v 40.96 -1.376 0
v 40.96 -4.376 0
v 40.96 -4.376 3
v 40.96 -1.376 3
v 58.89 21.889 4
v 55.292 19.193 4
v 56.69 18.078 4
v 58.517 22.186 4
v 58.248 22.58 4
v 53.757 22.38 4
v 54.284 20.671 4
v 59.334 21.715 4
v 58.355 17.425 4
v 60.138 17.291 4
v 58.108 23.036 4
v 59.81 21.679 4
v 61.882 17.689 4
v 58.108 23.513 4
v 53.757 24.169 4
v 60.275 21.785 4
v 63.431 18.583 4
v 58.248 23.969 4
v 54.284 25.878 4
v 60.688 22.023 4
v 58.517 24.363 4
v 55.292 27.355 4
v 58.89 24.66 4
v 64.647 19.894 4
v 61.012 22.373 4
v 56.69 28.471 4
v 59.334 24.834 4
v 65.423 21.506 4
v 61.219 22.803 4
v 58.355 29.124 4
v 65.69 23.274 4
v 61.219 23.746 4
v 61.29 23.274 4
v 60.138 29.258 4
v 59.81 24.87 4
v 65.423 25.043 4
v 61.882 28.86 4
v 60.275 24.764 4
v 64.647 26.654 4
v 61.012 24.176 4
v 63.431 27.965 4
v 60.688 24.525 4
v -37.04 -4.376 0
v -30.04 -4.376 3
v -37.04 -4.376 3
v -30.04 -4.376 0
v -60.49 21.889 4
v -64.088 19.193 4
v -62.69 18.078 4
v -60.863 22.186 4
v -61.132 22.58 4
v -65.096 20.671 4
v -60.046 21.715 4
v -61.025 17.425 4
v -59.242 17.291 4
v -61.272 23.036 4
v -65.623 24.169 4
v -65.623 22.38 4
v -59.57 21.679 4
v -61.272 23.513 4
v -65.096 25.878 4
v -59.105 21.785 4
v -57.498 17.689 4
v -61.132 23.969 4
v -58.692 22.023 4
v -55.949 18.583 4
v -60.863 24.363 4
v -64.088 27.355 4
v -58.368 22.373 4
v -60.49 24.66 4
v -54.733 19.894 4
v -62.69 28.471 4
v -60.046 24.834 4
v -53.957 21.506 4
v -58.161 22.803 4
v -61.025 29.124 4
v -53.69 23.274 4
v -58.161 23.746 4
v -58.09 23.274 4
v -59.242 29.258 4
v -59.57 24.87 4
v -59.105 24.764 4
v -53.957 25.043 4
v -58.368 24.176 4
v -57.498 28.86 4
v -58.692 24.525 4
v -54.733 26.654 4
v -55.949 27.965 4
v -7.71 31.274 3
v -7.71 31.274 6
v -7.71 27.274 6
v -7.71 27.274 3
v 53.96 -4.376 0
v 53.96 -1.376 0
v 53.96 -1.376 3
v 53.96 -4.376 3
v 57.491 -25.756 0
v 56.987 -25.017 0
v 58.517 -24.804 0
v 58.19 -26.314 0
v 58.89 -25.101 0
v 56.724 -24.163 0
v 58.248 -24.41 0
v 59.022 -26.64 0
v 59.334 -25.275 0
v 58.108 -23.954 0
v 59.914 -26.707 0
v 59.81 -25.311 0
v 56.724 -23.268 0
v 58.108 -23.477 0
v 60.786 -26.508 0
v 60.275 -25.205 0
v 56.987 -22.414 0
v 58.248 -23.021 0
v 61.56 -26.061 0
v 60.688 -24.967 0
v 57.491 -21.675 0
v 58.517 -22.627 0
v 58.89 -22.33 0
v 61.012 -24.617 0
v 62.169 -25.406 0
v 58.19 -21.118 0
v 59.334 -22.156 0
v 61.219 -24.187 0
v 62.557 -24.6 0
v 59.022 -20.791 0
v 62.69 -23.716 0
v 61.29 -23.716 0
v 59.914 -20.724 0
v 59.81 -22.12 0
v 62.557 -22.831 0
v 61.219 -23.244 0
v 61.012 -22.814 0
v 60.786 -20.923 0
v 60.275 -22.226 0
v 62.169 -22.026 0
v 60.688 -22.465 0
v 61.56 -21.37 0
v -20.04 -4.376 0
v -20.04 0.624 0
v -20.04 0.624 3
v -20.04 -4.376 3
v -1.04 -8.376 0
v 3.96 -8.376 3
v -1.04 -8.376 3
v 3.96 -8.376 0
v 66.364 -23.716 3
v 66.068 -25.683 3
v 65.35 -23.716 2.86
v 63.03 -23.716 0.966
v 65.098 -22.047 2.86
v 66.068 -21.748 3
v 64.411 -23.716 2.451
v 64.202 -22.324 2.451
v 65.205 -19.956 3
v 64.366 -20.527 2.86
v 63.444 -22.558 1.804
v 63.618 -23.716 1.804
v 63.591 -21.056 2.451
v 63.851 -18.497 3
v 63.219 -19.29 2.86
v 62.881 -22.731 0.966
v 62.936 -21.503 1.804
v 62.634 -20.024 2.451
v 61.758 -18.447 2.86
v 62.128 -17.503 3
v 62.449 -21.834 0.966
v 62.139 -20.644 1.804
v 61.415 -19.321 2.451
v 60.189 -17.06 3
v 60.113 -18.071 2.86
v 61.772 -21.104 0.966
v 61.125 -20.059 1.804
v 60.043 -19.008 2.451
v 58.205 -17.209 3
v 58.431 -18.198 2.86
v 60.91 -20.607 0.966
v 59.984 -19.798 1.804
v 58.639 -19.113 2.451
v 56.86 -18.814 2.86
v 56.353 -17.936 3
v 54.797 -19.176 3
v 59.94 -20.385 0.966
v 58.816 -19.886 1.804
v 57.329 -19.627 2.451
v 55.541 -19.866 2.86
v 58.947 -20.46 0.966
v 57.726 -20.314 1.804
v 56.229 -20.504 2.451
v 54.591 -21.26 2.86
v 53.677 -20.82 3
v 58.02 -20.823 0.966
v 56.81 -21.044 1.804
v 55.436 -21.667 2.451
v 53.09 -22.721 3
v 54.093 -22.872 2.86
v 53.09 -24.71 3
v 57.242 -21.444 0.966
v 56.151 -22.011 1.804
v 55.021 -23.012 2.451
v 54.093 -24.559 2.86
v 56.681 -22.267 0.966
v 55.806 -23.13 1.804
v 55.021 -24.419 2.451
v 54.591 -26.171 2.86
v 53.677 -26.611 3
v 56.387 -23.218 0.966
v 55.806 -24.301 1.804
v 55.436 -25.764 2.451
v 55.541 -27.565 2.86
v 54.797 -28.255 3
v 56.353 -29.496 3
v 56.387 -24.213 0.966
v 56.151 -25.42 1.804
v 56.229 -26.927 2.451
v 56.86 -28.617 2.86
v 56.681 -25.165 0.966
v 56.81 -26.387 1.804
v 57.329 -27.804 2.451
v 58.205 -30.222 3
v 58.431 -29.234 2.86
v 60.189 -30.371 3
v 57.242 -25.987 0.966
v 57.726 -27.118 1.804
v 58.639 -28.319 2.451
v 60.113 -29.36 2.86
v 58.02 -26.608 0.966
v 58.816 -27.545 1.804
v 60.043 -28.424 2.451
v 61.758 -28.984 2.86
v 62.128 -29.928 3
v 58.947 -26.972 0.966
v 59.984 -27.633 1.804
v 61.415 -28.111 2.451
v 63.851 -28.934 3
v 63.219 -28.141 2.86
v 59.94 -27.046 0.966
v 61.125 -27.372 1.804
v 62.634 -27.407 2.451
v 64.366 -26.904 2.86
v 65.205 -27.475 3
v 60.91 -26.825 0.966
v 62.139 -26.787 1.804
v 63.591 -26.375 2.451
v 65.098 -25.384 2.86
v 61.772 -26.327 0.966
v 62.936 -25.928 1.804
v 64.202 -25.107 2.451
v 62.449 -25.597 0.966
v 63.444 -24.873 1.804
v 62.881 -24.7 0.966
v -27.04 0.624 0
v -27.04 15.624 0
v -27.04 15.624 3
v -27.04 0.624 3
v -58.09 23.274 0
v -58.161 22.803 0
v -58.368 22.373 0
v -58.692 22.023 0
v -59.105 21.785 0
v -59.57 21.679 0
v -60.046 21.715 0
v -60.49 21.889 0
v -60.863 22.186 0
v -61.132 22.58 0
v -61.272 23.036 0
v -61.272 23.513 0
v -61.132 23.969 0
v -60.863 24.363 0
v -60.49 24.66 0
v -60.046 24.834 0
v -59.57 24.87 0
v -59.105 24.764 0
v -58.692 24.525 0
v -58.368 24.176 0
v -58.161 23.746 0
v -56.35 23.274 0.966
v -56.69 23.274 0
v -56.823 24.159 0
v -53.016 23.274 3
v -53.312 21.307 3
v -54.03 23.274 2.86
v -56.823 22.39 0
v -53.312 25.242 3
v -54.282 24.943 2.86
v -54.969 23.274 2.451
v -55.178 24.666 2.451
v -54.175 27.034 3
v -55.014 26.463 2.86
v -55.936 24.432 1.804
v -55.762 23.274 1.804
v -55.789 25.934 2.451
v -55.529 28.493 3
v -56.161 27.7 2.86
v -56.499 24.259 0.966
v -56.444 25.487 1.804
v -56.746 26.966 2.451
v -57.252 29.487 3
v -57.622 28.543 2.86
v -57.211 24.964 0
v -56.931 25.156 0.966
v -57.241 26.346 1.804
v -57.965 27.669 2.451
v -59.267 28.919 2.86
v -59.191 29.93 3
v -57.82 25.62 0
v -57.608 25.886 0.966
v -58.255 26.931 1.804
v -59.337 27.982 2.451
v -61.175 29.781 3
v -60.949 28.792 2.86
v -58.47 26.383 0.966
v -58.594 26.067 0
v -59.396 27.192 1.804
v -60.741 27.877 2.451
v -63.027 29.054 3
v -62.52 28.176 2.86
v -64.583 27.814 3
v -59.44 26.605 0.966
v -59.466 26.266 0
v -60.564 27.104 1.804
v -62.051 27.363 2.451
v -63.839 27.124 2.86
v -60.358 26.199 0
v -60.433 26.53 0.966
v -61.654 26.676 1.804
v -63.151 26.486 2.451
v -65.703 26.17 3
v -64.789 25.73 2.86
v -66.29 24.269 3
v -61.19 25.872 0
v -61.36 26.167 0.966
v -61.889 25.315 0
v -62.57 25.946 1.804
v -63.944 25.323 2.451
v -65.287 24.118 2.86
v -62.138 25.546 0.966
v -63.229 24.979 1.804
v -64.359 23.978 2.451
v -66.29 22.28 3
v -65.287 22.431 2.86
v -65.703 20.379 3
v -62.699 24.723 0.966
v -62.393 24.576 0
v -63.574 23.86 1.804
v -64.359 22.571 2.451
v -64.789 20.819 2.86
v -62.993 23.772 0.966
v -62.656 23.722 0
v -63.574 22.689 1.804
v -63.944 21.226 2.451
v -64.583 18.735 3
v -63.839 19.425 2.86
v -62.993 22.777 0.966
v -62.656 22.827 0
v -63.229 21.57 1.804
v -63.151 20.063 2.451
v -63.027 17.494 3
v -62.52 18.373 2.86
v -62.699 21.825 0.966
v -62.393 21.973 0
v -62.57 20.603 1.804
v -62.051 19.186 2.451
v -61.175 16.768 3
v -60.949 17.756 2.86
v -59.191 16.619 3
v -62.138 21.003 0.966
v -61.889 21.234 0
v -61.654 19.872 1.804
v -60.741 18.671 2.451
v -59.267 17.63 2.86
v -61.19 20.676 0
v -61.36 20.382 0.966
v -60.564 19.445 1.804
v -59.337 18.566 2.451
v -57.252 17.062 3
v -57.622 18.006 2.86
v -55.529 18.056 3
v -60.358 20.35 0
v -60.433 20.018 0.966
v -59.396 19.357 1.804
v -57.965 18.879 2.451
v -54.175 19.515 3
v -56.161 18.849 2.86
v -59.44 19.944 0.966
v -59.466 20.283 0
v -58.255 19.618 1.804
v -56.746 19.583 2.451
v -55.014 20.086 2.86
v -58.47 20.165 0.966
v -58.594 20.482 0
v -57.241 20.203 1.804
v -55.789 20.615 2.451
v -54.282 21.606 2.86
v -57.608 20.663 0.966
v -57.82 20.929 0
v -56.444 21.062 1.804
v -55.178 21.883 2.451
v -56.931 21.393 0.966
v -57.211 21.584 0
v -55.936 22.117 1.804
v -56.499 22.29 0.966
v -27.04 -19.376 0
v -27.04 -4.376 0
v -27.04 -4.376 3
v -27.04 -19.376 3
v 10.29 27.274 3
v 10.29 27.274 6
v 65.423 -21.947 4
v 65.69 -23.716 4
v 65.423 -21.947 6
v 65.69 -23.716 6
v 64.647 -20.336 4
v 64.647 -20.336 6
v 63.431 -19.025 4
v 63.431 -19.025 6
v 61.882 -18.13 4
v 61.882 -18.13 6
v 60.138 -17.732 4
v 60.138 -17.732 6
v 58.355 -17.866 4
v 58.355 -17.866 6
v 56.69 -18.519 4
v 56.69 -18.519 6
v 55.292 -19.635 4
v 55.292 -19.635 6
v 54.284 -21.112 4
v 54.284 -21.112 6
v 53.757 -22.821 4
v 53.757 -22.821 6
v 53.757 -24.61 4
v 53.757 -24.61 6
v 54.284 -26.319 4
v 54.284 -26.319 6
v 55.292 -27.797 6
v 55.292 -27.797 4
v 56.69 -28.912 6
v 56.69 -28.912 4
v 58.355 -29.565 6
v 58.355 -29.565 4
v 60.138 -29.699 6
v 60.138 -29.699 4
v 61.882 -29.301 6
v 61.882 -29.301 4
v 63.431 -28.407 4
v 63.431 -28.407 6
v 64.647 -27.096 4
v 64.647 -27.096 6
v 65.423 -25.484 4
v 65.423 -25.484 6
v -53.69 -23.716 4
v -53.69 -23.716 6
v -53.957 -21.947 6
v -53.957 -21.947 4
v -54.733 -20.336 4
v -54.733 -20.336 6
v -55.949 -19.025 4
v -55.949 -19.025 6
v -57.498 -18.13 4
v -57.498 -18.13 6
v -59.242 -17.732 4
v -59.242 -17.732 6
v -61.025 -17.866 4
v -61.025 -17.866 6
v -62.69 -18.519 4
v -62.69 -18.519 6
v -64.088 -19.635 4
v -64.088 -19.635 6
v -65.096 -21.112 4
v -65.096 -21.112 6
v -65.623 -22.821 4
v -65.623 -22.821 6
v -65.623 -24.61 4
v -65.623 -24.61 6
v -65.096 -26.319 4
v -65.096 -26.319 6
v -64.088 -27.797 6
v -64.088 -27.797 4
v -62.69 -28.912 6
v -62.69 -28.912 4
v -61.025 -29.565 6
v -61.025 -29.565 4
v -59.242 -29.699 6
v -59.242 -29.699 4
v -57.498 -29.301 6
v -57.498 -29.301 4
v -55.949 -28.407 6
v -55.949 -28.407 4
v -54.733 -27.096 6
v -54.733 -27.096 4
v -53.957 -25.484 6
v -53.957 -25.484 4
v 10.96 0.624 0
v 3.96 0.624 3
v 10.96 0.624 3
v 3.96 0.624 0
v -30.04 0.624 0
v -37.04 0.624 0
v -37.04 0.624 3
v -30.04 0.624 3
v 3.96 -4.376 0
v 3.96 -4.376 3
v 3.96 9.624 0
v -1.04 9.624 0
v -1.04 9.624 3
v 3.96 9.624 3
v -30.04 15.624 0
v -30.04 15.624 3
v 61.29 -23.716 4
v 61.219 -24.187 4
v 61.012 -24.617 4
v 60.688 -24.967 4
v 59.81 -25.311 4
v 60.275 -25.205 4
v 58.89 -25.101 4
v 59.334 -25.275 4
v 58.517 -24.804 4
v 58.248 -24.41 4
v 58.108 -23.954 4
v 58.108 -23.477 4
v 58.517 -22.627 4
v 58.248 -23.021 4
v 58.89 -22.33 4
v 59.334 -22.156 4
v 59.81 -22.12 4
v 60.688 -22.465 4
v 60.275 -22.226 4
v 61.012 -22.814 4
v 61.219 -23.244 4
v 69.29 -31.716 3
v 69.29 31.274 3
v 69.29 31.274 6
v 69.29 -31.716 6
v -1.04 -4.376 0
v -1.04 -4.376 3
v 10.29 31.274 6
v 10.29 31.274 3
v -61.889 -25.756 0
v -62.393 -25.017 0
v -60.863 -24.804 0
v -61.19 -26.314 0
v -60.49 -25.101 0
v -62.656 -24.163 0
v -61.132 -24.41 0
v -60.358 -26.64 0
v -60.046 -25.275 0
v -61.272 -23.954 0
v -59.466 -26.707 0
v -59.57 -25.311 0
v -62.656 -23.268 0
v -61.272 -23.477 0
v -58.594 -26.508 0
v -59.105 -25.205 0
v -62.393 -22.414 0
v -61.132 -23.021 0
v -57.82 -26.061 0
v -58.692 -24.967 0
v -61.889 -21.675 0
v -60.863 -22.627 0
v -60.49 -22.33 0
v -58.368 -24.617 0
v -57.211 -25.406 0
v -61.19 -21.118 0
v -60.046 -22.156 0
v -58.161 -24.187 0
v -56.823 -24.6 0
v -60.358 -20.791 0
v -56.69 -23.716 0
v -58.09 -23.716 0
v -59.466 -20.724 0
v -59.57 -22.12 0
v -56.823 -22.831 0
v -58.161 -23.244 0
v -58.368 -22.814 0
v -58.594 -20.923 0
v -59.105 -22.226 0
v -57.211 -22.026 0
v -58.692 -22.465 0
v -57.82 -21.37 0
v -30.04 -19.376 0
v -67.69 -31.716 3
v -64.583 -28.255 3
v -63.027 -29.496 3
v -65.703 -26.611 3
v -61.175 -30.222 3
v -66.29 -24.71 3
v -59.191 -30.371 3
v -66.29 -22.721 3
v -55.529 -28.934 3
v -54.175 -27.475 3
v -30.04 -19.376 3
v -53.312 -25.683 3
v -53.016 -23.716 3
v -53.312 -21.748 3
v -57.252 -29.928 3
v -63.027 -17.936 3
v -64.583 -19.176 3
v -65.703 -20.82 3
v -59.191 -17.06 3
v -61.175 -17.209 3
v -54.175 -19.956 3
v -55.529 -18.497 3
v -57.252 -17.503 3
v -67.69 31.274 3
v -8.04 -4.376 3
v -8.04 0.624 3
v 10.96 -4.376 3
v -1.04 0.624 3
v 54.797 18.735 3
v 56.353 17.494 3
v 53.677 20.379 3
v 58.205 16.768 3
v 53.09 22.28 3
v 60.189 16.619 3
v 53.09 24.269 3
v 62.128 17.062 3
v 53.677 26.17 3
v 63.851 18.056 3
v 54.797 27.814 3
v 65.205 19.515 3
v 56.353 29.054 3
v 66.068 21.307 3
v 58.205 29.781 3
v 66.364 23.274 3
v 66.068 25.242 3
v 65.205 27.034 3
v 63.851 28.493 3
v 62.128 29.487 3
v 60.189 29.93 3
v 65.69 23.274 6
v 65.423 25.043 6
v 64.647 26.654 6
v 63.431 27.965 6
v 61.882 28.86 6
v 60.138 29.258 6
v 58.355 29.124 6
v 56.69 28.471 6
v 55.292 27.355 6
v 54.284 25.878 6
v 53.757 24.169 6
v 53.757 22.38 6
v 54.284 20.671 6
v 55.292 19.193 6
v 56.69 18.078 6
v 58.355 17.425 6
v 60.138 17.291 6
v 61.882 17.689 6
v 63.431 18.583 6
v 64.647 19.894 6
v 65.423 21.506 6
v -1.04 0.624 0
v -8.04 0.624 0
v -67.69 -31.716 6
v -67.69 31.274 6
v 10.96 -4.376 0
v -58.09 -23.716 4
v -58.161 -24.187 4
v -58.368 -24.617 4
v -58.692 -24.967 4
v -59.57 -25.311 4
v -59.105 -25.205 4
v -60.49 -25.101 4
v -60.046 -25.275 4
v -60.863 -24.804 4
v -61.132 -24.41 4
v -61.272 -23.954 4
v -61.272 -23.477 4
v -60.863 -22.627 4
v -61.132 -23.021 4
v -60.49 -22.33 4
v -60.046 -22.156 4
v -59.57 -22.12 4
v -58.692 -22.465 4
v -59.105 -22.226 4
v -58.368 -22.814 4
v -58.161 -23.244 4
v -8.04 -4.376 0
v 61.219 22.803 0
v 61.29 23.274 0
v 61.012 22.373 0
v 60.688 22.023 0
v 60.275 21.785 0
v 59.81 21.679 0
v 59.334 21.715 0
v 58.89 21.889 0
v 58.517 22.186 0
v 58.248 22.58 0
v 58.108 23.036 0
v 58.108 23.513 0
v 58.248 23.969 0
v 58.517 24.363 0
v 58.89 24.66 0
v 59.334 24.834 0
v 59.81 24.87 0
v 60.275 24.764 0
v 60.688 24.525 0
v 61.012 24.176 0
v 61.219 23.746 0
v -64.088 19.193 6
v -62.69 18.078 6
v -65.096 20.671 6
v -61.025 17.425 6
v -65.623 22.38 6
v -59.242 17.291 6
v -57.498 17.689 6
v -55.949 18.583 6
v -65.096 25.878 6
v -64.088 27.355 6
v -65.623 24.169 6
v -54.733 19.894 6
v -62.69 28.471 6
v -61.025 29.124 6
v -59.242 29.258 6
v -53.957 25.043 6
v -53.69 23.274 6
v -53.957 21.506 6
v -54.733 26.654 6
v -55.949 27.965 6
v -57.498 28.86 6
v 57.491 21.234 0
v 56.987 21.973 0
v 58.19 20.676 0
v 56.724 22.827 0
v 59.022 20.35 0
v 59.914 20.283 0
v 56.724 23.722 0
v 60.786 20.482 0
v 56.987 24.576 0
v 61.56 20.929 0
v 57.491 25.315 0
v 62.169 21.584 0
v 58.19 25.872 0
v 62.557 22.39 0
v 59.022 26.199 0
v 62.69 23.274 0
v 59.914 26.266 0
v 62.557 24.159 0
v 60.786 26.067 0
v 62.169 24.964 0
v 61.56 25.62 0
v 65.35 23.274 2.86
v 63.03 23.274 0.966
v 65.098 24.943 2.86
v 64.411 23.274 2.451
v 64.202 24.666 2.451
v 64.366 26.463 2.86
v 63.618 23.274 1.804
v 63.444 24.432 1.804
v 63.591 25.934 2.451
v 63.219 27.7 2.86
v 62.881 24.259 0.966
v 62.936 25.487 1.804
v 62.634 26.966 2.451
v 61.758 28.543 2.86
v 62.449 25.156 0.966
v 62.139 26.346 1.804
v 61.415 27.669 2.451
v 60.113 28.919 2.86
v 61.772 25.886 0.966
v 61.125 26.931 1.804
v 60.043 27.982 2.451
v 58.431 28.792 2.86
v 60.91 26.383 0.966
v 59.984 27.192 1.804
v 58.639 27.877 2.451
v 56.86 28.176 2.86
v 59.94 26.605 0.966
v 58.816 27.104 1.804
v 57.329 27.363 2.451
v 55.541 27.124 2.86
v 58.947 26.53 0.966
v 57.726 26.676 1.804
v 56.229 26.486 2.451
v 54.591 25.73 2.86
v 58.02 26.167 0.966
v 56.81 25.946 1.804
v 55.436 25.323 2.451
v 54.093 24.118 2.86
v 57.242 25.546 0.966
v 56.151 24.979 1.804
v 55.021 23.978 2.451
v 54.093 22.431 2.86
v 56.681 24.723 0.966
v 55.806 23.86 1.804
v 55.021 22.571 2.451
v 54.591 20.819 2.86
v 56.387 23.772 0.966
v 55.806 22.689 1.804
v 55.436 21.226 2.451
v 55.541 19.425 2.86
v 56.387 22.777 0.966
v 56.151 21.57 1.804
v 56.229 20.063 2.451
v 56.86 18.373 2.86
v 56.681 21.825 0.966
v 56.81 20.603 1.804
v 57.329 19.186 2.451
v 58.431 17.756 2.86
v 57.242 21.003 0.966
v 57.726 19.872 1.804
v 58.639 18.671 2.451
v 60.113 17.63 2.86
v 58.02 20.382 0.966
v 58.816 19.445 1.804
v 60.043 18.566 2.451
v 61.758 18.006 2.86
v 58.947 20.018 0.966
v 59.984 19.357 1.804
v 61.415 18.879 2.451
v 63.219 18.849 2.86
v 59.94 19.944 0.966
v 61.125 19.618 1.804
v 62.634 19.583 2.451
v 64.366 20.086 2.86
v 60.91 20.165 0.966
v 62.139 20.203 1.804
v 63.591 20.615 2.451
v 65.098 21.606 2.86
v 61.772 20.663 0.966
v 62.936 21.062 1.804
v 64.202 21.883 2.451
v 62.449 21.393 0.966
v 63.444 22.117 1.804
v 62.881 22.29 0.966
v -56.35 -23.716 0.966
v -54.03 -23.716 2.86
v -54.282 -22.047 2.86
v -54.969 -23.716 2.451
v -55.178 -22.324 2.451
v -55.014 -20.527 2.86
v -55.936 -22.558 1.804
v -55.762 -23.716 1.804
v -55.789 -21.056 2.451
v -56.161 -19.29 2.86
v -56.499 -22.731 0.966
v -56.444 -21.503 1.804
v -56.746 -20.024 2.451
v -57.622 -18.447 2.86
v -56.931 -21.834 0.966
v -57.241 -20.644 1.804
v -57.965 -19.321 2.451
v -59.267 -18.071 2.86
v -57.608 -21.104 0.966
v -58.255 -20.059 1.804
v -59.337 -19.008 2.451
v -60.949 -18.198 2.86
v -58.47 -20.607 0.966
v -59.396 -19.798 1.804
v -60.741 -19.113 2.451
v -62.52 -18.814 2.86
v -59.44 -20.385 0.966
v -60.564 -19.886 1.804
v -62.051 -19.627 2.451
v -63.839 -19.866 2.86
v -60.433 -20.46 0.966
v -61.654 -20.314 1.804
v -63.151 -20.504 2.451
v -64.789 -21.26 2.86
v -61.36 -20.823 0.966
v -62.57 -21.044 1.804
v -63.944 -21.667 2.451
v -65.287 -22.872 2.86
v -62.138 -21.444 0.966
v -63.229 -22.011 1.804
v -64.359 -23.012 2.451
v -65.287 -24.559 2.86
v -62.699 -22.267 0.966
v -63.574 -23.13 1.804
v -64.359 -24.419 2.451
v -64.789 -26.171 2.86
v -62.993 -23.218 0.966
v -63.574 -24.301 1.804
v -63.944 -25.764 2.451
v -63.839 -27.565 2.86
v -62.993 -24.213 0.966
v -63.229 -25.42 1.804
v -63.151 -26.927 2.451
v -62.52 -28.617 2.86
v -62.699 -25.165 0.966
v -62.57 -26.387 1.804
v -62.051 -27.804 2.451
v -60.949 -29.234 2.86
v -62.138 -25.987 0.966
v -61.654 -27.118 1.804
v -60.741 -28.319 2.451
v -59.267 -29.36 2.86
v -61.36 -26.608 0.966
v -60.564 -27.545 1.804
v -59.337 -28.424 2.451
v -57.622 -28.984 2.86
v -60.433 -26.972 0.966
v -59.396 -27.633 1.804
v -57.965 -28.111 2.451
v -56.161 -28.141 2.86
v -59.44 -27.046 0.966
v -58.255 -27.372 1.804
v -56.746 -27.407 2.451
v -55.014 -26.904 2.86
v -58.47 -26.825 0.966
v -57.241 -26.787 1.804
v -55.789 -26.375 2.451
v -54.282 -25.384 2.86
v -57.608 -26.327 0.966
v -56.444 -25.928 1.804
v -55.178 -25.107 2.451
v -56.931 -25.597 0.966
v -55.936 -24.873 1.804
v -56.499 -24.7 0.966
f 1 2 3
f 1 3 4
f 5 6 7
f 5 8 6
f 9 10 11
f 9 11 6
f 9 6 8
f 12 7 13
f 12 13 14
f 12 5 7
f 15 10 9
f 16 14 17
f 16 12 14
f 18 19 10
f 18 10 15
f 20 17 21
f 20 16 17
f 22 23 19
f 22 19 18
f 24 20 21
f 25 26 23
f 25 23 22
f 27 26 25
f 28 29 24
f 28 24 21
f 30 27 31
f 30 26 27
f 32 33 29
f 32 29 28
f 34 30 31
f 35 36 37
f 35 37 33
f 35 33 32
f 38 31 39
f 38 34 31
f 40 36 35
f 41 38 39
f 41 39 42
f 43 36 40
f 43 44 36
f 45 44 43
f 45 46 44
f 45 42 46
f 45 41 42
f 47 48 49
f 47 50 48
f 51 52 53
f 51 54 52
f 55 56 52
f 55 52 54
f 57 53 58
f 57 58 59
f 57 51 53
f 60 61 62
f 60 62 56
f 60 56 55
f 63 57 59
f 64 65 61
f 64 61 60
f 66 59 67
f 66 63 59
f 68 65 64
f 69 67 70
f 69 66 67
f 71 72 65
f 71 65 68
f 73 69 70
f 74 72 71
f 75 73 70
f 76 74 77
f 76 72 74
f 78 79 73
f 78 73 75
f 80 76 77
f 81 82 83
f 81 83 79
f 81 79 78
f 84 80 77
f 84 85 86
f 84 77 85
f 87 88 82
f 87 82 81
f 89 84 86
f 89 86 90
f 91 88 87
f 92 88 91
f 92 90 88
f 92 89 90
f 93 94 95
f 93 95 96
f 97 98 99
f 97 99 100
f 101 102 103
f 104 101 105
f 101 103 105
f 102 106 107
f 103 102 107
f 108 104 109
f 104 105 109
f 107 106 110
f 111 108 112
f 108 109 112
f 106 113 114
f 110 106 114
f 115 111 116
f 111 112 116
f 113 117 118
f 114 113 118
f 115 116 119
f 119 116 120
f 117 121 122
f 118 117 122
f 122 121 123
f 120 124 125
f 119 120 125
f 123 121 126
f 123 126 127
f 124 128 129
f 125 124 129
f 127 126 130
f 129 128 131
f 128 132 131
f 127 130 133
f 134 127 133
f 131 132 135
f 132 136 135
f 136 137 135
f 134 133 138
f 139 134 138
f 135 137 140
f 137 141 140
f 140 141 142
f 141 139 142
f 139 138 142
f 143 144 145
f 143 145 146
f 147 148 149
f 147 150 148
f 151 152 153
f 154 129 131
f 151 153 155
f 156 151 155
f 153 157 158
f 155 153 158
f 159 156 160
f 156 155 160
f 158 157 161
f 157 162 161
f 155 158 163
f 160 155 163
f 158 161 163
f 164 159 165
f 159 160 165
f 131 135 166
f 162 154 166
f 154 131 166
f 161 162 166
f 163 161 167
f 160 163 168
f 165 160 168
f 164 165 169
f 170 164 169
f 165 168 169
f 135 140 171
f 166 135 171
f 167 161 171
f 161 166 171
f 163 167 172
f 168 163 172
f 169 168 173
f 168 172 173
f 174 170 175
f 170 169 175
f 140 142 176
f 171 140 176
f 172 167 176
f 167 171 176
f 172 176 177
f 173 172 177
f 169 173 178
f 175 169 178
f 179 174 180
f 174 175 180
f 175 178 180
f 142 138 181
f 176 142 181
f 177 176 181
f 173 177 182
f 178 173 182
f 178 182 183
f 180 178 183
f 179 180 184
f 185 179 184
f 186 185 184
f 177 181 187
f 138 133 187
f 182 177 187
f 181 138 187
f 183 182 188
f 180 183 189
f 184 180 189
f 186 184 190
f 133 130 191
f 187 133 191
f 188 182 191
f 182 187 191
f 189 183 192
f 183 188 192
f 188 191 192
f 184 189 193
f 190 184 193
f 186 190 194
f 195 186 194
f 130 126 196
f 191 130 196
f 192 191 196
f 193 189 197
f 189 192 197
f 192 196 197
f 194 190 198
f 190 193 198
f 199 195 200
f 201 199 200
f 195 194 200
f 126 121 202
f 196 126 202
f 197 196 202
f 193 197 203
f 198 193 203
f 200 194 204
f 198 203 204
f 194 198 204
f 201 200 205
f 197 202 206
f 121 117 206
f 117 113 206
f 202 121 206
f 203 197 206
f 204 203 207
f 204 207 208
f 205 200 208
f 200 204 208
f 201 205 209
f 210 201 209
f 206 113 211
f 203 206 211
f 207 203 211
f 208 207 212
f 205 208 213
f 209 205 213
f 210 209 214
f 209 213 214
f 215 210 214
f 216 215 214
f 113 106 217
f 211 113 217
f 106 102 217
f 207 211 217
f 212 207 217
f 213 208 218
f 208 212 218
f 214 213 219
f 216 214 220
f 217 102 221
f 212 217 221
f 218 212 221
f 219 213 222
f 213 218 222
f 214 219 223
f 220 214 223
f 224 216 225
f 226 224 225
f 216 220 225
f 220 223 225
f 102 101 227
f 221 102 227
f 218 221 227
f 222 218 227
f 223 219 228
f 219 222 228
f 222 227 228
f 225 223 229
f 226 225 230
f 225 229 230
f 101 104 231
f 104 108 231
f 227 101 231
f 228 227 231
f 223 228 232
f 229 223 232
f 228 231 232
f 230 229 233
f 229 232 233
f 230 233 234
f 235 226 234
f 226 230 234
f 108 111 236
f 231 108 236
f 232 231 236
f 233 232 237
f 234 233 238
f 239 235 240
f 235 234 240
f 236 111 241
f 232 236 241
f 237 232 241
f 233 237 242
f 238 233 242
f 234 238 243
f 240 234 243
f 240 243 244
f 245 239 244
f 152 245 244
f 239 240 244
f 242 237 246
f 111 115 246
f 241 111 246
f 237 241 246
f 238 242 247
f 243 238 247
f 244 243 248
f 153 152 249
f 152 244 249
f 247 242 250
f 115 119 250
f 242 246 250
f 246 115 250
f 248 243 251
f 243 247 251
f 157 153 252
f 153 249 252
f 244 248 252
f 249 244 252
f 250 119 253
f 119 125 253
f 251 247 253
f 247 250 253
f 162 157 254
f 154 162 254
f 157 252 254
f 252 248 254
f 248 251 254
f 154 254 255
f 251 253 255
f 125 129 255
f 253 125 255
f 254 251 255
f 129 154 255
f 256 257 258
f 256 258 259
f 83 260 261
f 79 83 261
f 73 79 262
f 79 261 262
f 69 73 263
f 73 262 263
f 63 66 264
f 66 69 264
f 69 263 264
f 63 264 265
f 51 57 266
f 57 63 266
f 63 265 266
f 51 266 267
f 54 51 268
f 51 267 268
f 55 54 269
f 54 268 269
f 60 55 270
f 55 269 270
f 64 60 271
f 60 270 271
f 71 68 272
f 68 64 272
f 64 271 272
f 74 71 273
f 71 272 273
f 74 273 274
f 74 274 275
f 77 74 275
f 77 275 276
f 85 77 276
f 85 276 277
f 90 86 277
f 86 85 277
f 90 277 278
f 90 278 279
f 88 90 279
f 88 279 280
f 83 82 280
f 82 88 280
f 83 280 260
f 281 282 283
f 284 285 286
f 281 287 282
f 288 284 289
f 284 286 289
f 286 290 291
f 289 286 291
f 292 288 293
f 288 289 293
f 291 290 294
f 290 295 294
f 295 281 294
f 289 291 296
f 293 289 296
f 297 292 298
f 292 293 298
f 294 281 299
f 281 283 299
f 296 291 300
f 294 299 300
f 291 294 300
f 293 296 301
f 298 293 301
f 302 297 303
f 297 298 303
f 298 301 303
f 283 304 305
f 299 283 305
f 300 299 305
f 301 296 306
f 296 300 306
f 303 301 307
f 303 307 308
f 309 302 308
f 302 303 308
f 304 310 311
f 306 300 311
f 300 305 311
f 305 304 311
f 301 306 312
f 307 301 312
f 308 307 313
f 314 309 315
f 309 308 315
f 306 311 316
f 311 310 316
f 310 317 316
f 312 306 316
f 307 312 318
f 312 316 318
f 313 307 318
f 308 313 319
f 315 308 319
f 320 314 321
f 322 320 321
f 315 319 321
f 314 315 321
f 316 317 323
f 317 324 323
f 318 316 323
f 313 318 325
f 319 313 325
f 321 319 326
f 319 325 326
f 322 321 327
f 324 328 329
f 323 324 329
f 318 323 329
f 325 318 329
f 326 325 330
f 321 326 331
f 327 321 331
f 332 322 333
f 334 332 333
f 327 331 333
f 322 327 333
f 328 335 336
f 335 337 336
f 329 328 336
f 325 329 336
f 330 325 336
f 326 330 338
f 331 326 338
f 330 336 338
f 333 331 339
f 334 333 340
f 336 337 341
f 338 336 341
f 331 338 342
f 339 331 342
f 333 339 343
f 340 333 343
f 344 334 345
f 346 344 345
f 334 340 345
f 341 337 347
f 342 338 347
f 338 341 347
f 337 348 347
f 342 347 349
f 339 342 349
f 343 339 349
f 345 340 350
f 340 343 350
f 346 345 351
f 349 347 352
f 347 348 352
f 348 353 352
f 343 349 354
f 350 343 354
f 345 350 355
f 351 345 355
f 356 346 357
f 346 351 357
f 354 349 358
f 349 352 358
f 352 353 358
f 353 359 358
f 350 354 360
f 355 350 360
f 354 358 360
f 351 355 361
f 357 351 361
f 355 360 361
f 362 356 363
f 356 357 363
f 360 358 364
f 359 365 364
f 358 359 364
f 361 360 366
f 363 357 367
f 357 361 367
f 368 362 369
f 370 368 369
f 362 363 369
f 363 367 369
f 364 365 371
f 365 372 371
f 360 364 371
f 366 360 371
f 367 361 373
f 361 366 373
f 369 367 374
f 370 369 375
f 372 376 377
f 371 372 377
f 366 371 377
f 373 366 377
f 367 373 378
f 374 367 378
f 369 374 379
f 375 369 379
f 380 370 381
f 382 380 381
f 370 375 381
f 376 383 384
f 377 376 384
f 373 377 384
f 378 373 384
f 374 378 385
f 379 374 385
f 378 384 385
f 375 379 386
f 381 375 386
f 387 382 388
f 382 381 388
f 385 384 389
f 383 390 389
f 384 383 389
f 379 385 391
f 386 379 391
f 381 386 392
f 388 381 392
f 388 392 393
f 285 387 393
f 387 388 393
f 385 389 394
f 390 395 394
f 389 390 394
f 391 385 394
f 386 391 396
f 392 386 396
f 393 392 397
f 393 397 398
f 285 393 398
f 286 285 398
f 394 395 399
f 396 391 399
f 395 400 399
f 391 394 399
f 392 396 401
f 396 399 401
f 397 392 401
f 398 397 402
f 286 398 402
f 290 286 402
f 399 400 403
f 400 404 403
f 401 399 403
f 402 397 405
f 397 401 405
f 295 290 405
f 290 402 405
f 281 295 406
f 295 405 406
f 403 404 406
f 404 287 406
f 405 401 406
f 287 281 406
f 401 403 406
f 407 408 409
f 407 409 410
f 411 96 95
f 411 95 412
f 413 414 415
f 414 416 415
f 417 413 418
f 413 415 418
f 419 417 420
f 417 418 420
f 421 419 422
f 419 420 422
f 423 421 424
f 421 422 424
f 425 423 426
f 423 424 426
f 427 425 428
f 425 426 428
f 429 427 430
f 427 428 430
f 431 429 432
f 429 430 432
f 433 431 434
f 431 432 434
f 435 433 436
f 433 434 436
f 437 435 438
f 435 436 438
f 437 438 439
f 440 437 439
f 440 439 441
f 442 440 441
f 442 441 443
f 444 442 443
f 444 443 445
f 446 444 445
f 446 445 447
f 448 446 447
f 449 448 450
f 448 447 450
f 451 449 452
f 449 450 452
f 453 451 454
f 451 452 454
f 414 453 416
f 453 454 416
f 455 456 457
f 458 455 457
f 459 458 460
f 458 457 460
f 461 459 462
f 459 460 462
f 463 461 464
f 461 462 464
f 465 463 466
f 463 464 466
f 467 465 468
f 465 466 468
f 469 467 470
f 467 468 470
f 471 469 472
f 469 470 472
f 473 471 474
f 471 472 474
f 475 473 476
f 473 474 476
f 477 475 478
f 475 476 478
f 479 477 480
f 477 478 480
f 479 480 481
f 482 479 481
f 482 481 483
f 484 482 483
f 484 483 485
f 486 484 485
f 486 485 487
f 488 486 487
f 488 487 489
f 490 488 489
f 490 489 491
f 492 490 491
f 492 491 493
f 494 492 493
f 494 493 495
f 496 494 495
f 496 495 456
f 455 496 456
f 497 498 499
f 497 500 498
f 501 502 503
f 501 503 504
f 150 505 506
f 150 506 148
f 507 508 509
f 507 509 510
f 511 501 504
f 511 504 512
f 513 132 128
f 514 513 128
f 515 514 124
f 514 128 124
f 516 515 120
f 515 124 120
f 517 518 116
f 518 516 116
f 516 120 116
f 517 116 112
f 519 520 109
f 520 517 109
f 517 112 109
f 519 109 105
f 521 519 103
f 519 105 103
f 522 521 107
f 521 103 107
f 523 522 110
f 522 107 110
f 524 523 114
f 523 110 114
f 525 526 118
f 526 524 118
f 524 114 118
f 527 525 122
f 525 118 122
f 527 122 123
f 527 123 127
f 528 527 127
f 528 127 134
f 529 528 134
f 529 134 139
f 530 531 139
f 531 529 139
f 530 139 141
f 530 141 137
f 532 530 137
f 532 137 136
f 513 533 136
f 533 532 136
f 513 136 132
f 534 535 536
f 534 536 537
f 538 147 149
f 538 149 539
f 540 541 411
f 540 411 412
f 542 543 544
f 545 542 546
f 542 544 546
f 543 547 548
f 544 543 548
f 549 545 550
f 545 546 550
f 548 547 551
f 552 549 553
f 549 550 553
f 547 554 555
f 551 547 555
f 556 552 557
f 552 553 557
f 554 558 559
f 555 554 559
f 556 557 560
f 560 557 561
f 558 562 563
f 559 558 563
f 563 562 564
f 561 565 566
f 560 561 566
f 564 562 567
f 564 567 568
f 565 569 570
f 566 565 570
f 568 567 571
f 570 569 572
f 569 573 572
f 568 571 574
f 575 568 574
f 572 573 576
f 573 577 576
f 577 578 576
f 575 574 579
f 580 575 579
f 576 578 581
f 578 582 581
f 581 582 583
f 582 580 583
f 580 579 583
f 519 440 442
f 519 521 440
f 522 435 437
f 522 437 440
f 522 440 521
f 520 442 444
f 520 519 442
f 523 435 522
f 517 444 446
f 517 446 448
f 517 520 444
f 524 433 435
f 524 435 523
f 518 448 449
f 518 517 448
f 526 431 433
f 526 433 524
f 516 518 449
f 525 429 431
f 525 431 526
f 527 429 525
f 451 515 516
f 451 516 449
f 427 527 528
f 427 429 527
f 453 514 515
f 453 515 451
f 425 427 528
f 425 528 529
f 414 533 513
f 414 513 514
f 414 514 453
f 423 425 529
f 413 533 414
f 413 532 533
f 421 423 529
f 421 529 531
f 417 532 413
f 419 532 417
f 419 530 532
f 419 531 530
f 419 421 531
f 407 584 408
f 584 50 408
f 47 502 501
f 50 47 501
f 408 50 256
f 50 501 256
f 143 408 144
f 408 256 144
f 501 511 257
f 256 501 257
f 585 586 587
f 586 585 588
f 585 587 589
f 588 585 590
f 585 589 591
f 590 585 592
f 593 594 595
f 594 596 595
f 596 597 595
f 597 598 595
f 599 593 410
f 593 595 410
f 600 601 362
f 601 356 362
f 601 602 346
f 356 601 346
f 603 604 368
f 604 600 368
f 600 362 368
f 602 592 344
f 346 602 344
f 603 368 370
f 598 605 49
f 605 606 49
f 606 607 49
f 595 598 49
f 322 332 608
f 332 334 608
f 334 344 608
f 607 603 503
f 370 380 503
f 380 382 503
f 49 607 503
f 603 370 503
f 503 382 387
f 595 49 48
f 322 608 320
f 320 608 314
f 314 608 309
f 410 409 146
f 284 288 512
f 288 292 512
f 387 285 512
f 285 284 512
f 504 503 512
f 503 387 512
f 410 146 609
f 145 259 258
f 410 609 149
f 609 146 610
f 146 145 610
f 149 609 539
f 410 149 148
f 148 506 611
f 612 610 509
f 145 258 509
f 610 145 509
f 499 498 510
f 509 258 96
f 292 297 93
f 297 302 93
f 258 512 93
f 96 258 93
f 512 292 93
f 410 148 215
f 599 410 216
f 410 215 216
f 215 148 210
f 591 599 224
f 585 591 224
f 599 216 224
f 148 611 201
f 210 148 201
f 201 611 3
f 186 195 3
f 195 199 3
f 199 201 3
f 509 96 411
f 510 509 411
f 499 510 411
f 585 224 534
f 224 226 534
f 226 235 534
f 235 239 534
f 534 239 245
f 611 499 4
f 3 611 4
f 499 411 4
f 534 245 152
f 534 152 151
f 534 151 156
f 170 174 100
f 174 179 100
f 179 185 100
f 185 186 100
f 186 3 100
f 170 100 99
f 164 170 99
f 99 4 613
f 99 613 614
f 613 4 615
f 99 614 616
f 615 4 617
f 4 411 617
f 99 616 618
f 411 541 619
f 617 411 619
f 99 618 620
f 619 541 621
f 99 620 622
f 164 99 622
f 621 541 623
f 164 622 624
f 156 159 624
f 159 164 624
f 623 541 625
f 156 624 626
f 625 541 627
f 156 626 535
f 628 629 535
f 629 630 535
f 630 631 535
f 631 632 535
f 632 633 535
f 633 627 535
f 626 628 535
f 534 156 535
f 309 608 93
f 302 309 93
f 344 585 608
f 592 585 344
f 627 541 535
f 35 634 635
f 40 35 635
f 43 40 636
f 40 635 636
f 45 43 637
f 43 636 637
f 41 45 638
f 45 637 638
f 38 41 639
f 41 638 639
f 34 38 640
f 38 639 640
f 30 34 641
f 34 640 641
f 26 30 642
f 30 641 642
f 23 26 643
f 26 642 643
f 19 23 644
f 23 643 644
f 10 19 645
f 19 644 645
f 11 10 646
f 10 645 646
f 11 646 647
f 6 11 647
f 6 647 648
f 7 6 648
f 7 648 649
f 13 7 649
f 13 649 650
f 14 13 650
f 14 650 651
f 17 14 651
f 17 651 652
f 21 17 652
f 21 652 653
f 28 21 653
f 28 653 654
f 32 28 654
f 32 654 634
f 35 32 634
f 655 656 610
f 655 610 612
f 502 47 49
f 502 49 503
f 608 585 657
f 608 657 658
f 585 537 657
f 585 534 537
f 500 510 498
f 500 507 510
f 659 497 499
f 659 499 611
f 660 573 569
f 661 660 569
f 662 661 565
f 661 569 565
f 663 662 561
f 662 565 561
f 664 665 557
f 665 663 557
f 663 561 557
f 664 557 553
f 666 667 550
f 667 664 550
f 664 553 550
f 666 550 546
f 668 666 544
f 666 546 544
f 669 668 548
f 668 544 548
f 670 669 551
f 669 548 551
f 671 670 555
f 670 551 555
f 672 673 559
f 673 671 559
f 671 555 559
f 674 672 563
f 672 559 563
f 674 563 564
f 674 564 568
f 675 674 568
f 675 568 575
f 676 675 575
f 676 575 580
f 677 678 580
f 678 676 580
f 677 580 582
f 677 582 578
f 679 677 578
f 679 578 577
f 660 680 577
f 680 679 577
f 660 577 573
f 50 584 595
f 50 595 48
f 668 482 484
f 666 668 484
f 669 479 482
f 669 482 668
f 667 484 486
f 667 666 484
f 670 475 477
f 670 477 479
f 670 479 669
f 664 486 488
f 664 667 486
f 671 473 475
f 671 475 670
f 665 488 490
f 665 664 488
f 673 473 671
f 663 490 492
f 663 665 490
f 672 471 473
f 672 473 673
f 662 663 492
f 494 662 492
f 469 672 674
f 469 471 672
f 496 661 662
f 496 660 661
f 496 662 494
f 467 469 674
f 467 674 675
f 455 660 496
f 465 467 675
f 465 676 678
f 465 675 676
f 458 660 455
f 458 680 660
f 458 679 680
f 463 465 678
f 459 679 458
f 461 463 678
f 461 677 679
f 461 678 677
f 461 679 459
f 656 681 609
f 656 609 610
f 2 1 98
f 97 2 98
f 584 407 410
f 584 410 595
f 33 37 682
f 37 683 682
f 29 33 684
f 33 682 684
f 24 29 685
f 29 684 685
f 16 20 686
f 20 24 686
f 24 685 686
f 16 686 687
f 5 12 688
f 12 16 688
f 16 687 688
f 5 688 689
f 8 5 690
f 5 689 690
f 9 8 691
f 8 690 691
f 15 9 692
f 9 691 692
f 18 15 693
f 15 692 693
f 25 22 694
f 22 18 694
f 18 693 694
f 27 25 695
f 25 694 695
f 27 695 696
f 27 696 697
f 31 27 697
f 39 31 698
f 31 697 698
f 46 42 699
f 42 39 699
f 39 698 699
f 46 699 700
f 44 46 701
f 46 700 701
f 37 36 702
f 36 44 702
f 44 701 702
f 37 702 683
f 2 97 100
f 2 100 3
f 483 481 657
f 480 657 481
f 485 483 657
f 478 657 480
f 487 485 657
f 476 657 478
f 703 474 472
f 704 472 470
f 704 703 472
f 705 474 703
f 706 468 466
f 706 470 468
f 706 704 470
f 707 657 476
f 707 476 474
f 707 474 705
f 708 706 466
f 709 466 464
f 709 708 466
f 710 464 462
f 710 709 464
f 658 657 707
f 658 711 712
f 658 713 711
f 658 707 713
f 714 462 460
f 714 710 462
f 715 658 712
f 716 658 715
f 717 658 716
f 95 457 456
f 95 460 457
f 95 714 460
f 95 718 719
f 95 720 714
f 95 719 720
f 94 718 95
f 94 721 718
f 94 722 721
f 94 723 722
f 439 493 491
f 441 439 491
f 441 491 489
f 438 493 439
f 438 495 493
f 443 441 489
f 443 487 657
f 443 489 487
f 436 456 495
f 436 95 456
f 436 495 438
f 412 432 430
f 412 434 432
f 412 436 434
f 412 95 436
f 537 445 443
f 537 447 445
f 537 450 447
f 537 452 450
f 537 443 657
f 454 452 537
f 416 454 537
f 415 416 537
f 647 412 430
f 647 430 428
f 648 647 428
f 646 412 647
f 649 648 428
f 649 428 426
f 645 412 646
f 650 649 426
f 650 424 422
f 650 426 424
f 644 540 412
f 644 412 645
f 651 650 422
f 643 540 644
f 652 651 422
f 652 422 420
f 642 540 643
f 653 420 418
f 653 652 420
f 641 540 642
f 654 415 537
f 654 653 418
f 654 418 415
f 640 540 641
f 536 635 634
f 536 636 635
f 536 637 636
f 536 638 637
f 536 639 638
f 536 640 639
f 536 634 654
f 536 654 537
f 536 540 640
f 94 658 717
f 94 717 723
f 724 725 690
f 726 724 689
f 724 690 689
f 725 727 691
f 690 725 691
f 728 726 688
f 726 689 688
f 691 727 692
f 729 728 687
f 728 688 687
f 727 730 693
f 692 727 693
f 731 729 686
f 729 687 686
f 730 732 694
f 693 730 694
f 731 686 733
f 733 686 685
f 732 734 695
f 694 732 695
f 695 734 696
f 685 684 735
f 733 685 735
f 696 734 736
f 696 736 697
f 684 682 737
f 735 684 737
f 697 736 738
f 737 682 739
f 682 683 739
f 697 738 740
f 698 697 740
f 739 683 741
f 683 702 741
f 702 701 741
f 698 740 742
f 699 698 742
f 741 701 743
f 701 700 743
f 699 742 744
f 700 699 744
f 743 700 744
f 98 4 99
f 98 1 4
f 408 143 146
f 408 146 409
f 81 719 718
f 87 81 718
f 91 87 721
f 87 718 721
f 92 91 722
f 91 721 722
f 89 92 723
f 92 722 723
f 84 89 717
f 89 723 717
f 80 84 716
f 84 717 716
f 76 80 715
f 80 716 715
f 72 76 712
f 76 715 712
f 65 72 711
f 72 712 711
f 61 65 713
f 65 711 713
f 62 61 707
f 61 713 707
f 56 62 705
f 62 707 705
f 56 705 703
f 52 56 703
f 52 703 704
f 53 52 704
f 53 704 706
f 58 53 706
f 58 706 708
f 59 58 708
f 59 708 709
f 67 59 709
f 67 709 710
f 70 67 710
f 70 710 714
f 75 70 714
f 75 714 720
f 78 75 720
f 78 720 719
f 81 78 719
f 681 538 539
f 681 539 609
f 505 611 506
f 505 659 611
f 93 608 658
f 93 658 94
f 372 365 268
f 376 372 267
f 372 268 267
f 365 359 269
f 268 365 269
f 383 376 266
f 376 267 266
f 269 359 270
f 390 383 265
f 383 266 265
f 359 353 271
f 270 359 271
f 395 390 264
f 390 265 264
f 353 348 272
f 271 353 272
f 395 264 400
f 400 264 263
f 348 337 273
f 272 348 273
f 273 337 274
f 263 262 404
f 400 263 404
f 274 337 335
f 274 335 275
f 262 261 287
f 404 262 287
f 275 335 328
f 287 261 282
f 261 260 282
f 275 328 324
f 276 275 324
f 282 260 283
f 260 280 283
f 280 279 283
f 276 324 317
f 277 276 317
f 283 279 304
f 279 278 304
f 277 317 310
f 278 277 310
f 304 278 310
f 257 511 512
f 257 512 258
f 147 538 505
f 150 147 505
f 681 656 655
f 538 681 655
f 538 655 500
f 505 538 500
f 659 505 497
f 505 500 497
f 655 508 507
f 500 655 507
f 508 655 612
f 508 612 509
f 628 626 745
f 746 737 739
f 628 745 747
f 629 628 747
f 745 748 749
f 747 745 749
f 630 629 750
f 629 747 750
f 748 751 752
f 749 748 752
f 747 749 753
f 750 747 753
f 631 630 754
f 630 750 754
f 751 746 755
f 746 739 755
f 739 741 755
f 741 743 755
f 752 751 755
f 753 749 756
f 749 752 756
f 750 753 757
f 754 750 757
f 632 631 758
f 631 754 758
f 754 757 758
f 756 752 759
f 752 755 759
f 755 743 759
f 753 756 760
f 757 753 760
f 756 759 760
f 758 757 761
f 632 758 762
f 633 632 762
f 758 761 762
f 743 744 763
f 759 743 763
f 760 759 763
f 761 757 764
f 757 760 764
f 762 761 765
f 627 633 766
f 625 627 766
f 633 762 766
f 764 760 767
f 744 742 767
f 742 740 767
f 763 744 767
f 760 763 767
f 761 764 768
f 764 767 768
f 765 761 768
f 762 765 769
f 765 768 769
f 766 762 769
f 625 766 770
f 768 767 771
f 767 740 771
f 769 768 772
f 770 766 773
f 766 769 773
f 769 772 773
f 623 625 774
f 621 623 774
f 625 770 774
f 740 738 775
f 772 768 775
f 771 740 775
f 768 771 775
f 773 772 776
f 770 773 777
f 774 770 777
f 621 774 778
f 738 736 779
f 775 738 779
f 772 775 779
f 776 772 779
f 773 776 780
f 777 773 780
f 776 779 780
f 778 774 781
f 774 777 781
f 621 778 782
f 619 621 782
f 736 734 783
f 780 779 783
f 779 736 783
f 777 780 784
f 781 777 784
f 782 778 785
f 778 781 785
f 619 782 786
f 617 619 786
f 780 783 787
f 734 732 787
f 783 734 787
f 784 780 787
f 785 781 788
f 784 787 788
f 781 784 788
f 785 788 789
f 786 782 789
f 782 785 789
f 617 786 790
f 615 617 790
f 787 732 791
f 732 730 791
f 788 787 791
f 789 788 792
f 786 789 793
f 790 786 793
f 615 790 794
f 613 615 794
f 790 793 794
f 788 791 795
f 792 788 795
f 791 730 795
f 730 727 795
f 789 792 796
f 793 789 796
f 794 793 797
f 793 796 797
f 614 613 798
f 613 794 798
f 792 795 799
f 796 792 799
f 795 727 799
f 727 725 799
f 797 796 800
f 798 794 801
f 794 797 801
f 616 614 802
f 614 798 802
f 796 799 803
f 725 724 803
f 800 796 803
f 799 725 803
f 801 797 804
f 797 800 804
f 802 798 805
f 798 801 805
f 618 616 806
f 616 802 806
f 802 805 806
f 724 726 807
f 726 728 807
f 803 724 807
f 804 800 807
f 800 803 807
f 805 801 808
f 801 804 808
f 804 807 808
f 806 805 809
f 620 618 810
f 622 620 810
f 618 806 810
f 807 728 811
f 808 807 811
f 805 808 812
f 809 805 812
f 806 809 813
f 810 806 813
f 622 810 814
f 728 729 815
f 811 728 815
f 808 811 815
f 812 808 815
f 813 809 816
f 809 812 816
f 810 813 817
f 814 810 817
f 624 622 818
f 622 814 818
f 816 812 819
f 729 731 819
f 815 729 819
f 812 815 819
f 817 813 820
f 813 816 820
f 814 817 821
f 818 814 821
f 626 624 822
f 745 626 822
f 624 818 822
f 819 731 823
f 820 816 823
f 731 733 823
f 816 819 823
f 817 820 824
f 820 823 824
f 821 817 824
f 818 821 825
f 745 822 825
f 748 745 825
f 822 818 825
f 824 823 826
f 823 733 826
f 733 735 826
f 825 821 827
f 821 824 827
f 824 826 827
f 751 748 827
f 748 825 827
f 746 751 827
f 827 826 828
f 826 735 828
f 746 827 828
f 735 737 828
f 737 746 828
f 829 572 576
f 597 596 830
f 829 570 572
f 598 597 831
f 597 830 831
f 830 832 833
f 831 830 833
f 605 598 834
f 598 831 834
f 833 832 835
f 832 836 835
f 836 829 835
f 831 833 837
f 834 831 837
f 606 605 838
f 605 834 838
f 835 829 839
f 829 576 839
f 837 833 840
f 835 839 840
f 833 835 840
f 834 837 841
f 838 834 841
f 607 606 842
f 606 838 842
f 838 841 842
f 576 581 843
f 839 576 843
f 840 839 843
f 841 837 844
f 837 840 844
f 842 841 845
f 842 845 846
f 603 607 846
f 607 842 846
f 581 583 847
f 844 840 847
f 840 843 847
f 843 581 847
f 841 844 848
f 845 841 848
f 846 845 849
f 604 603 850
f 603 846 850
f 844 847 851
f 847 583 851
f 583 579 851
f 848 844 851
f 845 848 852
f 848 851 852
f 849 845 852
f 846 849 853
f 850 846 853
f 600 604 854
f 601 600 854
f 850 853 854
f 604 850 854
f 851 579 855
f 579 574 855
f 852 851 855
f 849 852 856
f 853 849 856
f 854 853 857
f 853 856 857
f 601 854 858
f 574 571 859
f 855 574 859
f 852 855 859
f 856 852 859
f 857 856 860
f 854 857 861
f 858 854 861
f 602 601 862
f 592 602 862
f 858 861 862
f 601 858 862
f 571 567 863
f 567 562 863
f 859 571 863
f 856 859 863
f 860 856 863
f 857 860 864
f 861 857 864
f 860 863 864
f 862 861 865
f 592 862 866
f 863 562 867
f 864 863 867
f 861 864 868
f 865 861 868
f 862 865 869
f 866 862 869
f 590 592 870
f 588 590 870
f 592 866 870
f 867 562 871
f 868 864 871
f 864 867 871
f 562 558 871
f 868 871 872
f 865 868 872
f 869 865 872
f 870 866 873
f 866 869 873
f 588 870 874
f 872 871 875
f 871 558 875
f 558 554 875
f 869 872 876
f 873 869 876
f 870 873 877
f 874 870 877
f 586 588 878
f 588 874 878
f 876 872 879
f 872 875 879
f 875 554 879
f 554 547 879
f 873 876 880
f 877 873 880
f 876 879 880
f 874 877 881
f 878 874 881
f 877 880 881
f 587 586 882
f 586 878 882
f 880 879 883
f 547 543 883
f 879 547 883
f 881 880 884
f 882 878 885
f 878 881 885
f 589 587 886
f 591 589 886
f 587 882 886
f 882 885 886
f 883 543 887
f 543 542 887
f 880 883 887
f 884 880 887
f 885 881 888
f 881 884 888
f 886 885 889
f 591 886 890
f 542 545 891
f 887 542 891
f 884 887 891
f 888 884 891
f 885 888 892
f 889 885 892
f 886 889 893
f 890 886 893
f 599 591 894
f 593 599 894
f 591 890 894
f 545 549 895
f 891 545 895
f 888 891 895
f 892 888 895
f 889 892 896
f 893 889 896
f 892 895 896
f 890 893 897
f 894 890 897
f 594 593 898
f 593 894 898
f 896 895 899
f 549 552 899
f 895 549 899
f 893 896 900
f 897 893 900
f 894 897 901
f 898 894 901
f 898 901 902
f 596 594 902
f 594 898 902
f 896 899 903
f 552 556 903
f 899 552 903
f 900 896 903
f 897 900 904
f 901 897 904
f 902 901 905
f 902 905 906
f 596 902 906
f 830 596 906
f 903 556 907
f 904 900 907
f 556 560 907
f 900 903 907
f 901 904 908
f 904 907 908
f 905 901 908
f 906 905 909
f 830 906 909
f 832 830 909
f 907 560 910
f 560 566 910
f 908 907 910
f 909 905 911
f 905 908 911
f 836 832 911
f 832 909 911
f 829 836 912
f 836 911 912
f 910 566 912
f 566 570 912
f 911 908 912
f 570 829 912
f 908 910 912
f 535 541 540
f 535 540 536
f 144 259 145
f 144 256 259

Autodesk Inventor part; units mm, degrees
ref_plane "YZ Plane" through (0, 0, 0) normal (1, 0, 0) x (0, 1, 0)
ref_plane "XZ Plane" through (0, 0, 0) normal (0, 1, 0) x (-1, 0, 0)
ref_plane "XY Plane" through (0, 0, 0) normal (0, 0, 1) x (1, 0, 0)
ref_plane "Arbeitsebene1" through (0, 0, 0) normal (0, 0, 1) x (1, 0, 0)
sketch "Skizze1" plane through (0, 0, 0) normal (0, 0, 1) x (1, 0, 0)
  circle A0 centre (-59.69, 23.2744) radius 1.6 projected
  circle A1 centre (59.69, 23.2744) radius 1.6 projected
  circle A2 centre (59.69, -23.7156) radius 1.6 projected
  circle A3 centre (-59.69, -23.7156) radius 1.6 projected
  circle A4 centre (-59.69, 23.2744) radius 3
  circle A5 centre (59.69, 23.2744) radius 3
  circle A6 centre (59.69, -23.7156) radius 3
  circle A7 centre (-59.69, -23.7156) radius 3
  point P0 (0, 0)
  dimension "d0" = 6
  dimension "d1" = 6
  dimension "d2" = 6
  dimension "d3" = 6
extrude "Extrusion1" add sketch "Skizze1" along normal blind 3
ref_plane "Arbeitsebene2" through (0, 0, 0) normal (0, 0, 1) x (1, 0, 0)
sketch "Skizze2" plane through (0, 0, 0) normal (0, 0, 1) x (1, 0, 0)
  line L0 (-30.04, 15.6244) -> (-27.04, 15.6244)
  line L1 (-27.04, -19.3756) -> (-30.04, -19.3756)
  line L2 (-20.04, 0.6244) -> (-20.04, -4.3756)
  line L3 (-37.04, -4.3756) -> (-37.04, 0.6244)
  line L4 (-1.04, 9.6244) -> (3.96, 9.6244)
  line L5 (3.96, -8.3756) -> (-1.04, -8.3756)
  line L6 (10.96, 0.6244) -> (10.96, -4.3756)
  line L7 (-8.04, -4.3756) -> (-8.04, 0.6244)
  line L8 (40.96, -1.3756) -> (53.96, -1.3756)
  line L9 (53.96, -1.3756) -> (53.96, -4.3756)
  line L10 (53.96, -4.3756) -> (40.96, -4.3756)
  line L11 (40.96, -4.3756) -> (40.96, -1.3756)
  line L12 (-8.04, 0.6244) -> (-1.04, 0.6244)
  line L13 (3.96, 0.6244) -> (10.96, 0.6244)
  line L14 (3.96, 9.6244) -> (3.96, 0.6244)
  line L15 (3.96, -4.3756) -> (3.96, -8.3756)
  line L16 (10.96, -4.3756) -> (3.96, -4.3756)
  line L17 (-1.04, -4.3756) -> (-8.04, -4.3756)
  line L18 (-1.04, -8.3756) -> (-1.04, -4.3756)
  line L19 (-1.04, 0.6244) -> (-1.04, 9.6244)
  line L20 (-37.04, 0.6244) -> (-30.04, 0.6244)
  line L21 (-27.04, 0.6244) -> (-20.04, 0.6244)
  line L22 (-27.04, 15.6244) -> (-27.04, 0.6244)
  line L23 (-27.04, -4.3756) -> (-27.04, -19.3756)
  line L24 (-30.04, -19.3756) -> (-30.04, -4.3756)
  line L25 (-30.04, 0.6244) -> (-30.04, 15.6244)
  line L26 (-20.04, -4.3756) -> (-27.04, -4.3756)
  line L27 (-30.04, -4.3756) -> (-37.04, -4.3756)
  line L28 (-66.04, -24.3506) -> (-66.04, 23.2744) projected
  line L29 (-59.69, 29.6244) -> (59.69, 29.6244) projected
  point P0 (0, 0)
  dimension "d6" = 3
  dimension "d7" = 7
  dimension "d8" = 7
  dimension "d9" = 7
  dimension "d10" = 7
  dimension "d11" = 3
  dimension "d12" = 15
  dimension "d13" = 15
  dimension "d14" = 15
  dimension "d15" = 15
  dimension "d16" = 5
  dimension "d17" = 29
  dimension "d18" = 14
  dimension "d19" = 20
  dimension "d20" = 18
  dimension "d21" = 7
  dimension "d22" = 7
  dimension "d23" = 12
  dimension "d24" = 5
  dimension "d25" = 13
  dimension "d26" = 30
  dimension "d27" = 31
extrude "Extrusion2" add sketch "Skizze2" along normal up to surface (3 mm away)
sketch "Skizze3" plane through (-8.04, 0.6244, 3) normal (0, 0, 1) x (1, 0, 0)
  line L0 (-59.65, 30.65) -> (77.33, 30.65)
  line L1 (77.33, 30.65) -> (77.33, -32.34)
  line L2 (77.33, -32.34) -> (-59.65, -32.34)
  line L3 (-59.65, -32.34) -> (-59.65, 30.65)
  circle A0 centre (67.73, 22.65) radius 1.6 projected
  circle A1 centre (-51.65, 22.65) radius 1.6 projected
  circle A2 centre (-51.65, -24.34) radius 1.6 projected
  circle A3 centre (67.73, -24.34) radius 1.6 projected
  point P0 (8.04, -0.6244)
  dimension "d31" = 8
  dimension "d32" = 8
  dimension "d33" = 8
  dimension "d34" = 8
extrude "Extrusion3" add sketch "Skizze3" along normal blind 3
fillet "Rundung1" radius 3.75 4 edges at (-62.69, -23.7156, 3) (56.69, -23.7156, 3) (56.69, 23.2744, 3) (-62.69, 23.2744, 3)
sketch "Skizze5" plane through (-8.04, 0.6244, 6) normal (0, 0, 1) x (1, 0, 0)
  circle A0 centre (67.73, 22.65) radius 1.6 projected
  circle A1 centre (67.73, 22.65) radius 6
  circle A2 centre (67.73, -24.34) radius 6
  circle A3 centre (-51.65, 22.65) radius 1.6 projected
  circle A4 centre (-51.65, 22.65) radius 6
  circle A5 centre (-51.65, -24.34) radius 6
  circle A6 centre (-51.65, -24.34) radius 1.6 projected
  circle A7 centre (67.73, -24.34) radius 1.6 projected
  point P0 (8.04, -0.6244)
  dimension "d44" = 12
  dimension "d45" = 12
  dimension "d46" = 12
  dimension "d47" = 12
extrude "Extrusion5" cut sketch "Skizze5" against normal blind 2
sketch "Skizze6" plane through (-67.69, 31.2744, 3) normal (0, 1, 0) x (1, 0, 0)
  line L0 (0, 0) -> (136.98, 0) projected
  line L1 (59.98, 0) -> (77.98, 0)
  line L2 (77.98, 0) -> (77.98, -1.5)
  line L3 (77.98, -1.5) -> (59.98, -1.5)
  line L4 (59.98, -1.5) -> (59.98, 0)
  line L5 (136.98, 0) -> (136.98, -3) projected
  point P0 (67.69, 3)
  dimension "d50" = 1.5
  dimension "d51" = 18
  dimension "d52" = 59
extrude "Extrusion6" cut sketch "Skizze6" against normal blind 4
move faces "Verschieben1" translate (0, 0, 2.5) faces at (4.29, 29.9411, 4.5)
sketch "Skizze7" plane through (-8.04, 0.6244, 6) normal (0, 0, 1) x (1, 0, 0)
  line L0 (-59.65, 30.65) -> (-59.65, -32.34) projected
  line L1 (-59.65, -32.34) -> (77.33, -32.34) projected
  line L2 (0.33, 30.65) -> (-59.65, 30.65) projected
  line L3 (77.33, -32.34) -> (77.33, 30.65) projected
  line L4 (77.33, 30.65) -> (18.33, 30.65) projected
  line L5 (-54.65, -32.34) -> (72.33, -32.34)
  line L6 (77.33, -27.34) -> (77.33, 25.65)
  line L7 (-59.65, 25.65) -> (-59.65, -27.34)
  line L8 (0.33, 26.65) -> (18.33, 26.65) projected
  line L9 (18.33, 30.65) -> (18.33, 26.65)
  line L10 (18.33, 26.65) -> (0.33, 26.65)
  line L11 (0.33, 26.65) -> (0.33, 30.65)
  line L12 (72.33, 30.65) -> (18.33, 30.65)
  line L13 (0.33, 30.65) -> (-54.65, 30.65)
  line L14 (0.33, 30.65) -> (0.33, 26.65) projected
  arc A0 (-59.65, -27.34) -> (-54.65, -32.34) centre (-54.65, -27.34) ccw
  arc A1 (-54.65, 30.65) -> (-59.65, 25.65) centre (-54.65, 25.65) ccw
  arc A2 (72.33, -32.34) -> (77.33, -27.34) centre (72.33, -27.34) ccw
  arc A3 (77.33, 25.65) -> (72.33, 30.65) centre (72.33, 25.65) ccw
  line L15 (-59.65, -27.34) -> (-59.65, -32.34)
  line L16 (-59.65, -32.34) -> (-54.65, -32.34)
  line L17 (-59.65, 30.65) -> (0.33, 30.65) projected
  line L18 (-59.65, 30.65) -> (-54.65, 30.65)
  line L19 (-59.65, 30.65) -> (-59.65, 25.65)
  line L20 (77.33, 30.65) -> (77.33, -32.34) projected
  line L21 (72.33, -32.34) -> (77.33, -32.34)
  line L22 (77.33, -32.34) -> (77.33, -27.34)
  line L23 (77.33, 25.65) -> (77.33, 30.65)
  line L24 (72.33, 30.65) -> (77.33, 30.65)
  point P0 (8.04, -0.6244)
  dimension "d58" = 4
  dimension "d59" = 4
  dimension "d60" = 5
equation "\"d1\" = d0"
equation "\"d2\" = d0"
equation "\"d3\" = d0"
equation "\"d7\" = d8"
equation "\"d9\" = d8"
equation "\"d10\" = d7"
equation "\"d14\" = d12"
equation "\"d15\" = d13"
equation "\"d21\" = d7"
equation "\"d22\" = d7"
equation "\"d32\" = d31"
equation "\"d33\" = d32"
equation "\"d34\" = d33"
equation "\"d45\" = d44"
equation "\"d46\" = d44"
equation "\"d47\" = d46"
properties part number "case_bot"
